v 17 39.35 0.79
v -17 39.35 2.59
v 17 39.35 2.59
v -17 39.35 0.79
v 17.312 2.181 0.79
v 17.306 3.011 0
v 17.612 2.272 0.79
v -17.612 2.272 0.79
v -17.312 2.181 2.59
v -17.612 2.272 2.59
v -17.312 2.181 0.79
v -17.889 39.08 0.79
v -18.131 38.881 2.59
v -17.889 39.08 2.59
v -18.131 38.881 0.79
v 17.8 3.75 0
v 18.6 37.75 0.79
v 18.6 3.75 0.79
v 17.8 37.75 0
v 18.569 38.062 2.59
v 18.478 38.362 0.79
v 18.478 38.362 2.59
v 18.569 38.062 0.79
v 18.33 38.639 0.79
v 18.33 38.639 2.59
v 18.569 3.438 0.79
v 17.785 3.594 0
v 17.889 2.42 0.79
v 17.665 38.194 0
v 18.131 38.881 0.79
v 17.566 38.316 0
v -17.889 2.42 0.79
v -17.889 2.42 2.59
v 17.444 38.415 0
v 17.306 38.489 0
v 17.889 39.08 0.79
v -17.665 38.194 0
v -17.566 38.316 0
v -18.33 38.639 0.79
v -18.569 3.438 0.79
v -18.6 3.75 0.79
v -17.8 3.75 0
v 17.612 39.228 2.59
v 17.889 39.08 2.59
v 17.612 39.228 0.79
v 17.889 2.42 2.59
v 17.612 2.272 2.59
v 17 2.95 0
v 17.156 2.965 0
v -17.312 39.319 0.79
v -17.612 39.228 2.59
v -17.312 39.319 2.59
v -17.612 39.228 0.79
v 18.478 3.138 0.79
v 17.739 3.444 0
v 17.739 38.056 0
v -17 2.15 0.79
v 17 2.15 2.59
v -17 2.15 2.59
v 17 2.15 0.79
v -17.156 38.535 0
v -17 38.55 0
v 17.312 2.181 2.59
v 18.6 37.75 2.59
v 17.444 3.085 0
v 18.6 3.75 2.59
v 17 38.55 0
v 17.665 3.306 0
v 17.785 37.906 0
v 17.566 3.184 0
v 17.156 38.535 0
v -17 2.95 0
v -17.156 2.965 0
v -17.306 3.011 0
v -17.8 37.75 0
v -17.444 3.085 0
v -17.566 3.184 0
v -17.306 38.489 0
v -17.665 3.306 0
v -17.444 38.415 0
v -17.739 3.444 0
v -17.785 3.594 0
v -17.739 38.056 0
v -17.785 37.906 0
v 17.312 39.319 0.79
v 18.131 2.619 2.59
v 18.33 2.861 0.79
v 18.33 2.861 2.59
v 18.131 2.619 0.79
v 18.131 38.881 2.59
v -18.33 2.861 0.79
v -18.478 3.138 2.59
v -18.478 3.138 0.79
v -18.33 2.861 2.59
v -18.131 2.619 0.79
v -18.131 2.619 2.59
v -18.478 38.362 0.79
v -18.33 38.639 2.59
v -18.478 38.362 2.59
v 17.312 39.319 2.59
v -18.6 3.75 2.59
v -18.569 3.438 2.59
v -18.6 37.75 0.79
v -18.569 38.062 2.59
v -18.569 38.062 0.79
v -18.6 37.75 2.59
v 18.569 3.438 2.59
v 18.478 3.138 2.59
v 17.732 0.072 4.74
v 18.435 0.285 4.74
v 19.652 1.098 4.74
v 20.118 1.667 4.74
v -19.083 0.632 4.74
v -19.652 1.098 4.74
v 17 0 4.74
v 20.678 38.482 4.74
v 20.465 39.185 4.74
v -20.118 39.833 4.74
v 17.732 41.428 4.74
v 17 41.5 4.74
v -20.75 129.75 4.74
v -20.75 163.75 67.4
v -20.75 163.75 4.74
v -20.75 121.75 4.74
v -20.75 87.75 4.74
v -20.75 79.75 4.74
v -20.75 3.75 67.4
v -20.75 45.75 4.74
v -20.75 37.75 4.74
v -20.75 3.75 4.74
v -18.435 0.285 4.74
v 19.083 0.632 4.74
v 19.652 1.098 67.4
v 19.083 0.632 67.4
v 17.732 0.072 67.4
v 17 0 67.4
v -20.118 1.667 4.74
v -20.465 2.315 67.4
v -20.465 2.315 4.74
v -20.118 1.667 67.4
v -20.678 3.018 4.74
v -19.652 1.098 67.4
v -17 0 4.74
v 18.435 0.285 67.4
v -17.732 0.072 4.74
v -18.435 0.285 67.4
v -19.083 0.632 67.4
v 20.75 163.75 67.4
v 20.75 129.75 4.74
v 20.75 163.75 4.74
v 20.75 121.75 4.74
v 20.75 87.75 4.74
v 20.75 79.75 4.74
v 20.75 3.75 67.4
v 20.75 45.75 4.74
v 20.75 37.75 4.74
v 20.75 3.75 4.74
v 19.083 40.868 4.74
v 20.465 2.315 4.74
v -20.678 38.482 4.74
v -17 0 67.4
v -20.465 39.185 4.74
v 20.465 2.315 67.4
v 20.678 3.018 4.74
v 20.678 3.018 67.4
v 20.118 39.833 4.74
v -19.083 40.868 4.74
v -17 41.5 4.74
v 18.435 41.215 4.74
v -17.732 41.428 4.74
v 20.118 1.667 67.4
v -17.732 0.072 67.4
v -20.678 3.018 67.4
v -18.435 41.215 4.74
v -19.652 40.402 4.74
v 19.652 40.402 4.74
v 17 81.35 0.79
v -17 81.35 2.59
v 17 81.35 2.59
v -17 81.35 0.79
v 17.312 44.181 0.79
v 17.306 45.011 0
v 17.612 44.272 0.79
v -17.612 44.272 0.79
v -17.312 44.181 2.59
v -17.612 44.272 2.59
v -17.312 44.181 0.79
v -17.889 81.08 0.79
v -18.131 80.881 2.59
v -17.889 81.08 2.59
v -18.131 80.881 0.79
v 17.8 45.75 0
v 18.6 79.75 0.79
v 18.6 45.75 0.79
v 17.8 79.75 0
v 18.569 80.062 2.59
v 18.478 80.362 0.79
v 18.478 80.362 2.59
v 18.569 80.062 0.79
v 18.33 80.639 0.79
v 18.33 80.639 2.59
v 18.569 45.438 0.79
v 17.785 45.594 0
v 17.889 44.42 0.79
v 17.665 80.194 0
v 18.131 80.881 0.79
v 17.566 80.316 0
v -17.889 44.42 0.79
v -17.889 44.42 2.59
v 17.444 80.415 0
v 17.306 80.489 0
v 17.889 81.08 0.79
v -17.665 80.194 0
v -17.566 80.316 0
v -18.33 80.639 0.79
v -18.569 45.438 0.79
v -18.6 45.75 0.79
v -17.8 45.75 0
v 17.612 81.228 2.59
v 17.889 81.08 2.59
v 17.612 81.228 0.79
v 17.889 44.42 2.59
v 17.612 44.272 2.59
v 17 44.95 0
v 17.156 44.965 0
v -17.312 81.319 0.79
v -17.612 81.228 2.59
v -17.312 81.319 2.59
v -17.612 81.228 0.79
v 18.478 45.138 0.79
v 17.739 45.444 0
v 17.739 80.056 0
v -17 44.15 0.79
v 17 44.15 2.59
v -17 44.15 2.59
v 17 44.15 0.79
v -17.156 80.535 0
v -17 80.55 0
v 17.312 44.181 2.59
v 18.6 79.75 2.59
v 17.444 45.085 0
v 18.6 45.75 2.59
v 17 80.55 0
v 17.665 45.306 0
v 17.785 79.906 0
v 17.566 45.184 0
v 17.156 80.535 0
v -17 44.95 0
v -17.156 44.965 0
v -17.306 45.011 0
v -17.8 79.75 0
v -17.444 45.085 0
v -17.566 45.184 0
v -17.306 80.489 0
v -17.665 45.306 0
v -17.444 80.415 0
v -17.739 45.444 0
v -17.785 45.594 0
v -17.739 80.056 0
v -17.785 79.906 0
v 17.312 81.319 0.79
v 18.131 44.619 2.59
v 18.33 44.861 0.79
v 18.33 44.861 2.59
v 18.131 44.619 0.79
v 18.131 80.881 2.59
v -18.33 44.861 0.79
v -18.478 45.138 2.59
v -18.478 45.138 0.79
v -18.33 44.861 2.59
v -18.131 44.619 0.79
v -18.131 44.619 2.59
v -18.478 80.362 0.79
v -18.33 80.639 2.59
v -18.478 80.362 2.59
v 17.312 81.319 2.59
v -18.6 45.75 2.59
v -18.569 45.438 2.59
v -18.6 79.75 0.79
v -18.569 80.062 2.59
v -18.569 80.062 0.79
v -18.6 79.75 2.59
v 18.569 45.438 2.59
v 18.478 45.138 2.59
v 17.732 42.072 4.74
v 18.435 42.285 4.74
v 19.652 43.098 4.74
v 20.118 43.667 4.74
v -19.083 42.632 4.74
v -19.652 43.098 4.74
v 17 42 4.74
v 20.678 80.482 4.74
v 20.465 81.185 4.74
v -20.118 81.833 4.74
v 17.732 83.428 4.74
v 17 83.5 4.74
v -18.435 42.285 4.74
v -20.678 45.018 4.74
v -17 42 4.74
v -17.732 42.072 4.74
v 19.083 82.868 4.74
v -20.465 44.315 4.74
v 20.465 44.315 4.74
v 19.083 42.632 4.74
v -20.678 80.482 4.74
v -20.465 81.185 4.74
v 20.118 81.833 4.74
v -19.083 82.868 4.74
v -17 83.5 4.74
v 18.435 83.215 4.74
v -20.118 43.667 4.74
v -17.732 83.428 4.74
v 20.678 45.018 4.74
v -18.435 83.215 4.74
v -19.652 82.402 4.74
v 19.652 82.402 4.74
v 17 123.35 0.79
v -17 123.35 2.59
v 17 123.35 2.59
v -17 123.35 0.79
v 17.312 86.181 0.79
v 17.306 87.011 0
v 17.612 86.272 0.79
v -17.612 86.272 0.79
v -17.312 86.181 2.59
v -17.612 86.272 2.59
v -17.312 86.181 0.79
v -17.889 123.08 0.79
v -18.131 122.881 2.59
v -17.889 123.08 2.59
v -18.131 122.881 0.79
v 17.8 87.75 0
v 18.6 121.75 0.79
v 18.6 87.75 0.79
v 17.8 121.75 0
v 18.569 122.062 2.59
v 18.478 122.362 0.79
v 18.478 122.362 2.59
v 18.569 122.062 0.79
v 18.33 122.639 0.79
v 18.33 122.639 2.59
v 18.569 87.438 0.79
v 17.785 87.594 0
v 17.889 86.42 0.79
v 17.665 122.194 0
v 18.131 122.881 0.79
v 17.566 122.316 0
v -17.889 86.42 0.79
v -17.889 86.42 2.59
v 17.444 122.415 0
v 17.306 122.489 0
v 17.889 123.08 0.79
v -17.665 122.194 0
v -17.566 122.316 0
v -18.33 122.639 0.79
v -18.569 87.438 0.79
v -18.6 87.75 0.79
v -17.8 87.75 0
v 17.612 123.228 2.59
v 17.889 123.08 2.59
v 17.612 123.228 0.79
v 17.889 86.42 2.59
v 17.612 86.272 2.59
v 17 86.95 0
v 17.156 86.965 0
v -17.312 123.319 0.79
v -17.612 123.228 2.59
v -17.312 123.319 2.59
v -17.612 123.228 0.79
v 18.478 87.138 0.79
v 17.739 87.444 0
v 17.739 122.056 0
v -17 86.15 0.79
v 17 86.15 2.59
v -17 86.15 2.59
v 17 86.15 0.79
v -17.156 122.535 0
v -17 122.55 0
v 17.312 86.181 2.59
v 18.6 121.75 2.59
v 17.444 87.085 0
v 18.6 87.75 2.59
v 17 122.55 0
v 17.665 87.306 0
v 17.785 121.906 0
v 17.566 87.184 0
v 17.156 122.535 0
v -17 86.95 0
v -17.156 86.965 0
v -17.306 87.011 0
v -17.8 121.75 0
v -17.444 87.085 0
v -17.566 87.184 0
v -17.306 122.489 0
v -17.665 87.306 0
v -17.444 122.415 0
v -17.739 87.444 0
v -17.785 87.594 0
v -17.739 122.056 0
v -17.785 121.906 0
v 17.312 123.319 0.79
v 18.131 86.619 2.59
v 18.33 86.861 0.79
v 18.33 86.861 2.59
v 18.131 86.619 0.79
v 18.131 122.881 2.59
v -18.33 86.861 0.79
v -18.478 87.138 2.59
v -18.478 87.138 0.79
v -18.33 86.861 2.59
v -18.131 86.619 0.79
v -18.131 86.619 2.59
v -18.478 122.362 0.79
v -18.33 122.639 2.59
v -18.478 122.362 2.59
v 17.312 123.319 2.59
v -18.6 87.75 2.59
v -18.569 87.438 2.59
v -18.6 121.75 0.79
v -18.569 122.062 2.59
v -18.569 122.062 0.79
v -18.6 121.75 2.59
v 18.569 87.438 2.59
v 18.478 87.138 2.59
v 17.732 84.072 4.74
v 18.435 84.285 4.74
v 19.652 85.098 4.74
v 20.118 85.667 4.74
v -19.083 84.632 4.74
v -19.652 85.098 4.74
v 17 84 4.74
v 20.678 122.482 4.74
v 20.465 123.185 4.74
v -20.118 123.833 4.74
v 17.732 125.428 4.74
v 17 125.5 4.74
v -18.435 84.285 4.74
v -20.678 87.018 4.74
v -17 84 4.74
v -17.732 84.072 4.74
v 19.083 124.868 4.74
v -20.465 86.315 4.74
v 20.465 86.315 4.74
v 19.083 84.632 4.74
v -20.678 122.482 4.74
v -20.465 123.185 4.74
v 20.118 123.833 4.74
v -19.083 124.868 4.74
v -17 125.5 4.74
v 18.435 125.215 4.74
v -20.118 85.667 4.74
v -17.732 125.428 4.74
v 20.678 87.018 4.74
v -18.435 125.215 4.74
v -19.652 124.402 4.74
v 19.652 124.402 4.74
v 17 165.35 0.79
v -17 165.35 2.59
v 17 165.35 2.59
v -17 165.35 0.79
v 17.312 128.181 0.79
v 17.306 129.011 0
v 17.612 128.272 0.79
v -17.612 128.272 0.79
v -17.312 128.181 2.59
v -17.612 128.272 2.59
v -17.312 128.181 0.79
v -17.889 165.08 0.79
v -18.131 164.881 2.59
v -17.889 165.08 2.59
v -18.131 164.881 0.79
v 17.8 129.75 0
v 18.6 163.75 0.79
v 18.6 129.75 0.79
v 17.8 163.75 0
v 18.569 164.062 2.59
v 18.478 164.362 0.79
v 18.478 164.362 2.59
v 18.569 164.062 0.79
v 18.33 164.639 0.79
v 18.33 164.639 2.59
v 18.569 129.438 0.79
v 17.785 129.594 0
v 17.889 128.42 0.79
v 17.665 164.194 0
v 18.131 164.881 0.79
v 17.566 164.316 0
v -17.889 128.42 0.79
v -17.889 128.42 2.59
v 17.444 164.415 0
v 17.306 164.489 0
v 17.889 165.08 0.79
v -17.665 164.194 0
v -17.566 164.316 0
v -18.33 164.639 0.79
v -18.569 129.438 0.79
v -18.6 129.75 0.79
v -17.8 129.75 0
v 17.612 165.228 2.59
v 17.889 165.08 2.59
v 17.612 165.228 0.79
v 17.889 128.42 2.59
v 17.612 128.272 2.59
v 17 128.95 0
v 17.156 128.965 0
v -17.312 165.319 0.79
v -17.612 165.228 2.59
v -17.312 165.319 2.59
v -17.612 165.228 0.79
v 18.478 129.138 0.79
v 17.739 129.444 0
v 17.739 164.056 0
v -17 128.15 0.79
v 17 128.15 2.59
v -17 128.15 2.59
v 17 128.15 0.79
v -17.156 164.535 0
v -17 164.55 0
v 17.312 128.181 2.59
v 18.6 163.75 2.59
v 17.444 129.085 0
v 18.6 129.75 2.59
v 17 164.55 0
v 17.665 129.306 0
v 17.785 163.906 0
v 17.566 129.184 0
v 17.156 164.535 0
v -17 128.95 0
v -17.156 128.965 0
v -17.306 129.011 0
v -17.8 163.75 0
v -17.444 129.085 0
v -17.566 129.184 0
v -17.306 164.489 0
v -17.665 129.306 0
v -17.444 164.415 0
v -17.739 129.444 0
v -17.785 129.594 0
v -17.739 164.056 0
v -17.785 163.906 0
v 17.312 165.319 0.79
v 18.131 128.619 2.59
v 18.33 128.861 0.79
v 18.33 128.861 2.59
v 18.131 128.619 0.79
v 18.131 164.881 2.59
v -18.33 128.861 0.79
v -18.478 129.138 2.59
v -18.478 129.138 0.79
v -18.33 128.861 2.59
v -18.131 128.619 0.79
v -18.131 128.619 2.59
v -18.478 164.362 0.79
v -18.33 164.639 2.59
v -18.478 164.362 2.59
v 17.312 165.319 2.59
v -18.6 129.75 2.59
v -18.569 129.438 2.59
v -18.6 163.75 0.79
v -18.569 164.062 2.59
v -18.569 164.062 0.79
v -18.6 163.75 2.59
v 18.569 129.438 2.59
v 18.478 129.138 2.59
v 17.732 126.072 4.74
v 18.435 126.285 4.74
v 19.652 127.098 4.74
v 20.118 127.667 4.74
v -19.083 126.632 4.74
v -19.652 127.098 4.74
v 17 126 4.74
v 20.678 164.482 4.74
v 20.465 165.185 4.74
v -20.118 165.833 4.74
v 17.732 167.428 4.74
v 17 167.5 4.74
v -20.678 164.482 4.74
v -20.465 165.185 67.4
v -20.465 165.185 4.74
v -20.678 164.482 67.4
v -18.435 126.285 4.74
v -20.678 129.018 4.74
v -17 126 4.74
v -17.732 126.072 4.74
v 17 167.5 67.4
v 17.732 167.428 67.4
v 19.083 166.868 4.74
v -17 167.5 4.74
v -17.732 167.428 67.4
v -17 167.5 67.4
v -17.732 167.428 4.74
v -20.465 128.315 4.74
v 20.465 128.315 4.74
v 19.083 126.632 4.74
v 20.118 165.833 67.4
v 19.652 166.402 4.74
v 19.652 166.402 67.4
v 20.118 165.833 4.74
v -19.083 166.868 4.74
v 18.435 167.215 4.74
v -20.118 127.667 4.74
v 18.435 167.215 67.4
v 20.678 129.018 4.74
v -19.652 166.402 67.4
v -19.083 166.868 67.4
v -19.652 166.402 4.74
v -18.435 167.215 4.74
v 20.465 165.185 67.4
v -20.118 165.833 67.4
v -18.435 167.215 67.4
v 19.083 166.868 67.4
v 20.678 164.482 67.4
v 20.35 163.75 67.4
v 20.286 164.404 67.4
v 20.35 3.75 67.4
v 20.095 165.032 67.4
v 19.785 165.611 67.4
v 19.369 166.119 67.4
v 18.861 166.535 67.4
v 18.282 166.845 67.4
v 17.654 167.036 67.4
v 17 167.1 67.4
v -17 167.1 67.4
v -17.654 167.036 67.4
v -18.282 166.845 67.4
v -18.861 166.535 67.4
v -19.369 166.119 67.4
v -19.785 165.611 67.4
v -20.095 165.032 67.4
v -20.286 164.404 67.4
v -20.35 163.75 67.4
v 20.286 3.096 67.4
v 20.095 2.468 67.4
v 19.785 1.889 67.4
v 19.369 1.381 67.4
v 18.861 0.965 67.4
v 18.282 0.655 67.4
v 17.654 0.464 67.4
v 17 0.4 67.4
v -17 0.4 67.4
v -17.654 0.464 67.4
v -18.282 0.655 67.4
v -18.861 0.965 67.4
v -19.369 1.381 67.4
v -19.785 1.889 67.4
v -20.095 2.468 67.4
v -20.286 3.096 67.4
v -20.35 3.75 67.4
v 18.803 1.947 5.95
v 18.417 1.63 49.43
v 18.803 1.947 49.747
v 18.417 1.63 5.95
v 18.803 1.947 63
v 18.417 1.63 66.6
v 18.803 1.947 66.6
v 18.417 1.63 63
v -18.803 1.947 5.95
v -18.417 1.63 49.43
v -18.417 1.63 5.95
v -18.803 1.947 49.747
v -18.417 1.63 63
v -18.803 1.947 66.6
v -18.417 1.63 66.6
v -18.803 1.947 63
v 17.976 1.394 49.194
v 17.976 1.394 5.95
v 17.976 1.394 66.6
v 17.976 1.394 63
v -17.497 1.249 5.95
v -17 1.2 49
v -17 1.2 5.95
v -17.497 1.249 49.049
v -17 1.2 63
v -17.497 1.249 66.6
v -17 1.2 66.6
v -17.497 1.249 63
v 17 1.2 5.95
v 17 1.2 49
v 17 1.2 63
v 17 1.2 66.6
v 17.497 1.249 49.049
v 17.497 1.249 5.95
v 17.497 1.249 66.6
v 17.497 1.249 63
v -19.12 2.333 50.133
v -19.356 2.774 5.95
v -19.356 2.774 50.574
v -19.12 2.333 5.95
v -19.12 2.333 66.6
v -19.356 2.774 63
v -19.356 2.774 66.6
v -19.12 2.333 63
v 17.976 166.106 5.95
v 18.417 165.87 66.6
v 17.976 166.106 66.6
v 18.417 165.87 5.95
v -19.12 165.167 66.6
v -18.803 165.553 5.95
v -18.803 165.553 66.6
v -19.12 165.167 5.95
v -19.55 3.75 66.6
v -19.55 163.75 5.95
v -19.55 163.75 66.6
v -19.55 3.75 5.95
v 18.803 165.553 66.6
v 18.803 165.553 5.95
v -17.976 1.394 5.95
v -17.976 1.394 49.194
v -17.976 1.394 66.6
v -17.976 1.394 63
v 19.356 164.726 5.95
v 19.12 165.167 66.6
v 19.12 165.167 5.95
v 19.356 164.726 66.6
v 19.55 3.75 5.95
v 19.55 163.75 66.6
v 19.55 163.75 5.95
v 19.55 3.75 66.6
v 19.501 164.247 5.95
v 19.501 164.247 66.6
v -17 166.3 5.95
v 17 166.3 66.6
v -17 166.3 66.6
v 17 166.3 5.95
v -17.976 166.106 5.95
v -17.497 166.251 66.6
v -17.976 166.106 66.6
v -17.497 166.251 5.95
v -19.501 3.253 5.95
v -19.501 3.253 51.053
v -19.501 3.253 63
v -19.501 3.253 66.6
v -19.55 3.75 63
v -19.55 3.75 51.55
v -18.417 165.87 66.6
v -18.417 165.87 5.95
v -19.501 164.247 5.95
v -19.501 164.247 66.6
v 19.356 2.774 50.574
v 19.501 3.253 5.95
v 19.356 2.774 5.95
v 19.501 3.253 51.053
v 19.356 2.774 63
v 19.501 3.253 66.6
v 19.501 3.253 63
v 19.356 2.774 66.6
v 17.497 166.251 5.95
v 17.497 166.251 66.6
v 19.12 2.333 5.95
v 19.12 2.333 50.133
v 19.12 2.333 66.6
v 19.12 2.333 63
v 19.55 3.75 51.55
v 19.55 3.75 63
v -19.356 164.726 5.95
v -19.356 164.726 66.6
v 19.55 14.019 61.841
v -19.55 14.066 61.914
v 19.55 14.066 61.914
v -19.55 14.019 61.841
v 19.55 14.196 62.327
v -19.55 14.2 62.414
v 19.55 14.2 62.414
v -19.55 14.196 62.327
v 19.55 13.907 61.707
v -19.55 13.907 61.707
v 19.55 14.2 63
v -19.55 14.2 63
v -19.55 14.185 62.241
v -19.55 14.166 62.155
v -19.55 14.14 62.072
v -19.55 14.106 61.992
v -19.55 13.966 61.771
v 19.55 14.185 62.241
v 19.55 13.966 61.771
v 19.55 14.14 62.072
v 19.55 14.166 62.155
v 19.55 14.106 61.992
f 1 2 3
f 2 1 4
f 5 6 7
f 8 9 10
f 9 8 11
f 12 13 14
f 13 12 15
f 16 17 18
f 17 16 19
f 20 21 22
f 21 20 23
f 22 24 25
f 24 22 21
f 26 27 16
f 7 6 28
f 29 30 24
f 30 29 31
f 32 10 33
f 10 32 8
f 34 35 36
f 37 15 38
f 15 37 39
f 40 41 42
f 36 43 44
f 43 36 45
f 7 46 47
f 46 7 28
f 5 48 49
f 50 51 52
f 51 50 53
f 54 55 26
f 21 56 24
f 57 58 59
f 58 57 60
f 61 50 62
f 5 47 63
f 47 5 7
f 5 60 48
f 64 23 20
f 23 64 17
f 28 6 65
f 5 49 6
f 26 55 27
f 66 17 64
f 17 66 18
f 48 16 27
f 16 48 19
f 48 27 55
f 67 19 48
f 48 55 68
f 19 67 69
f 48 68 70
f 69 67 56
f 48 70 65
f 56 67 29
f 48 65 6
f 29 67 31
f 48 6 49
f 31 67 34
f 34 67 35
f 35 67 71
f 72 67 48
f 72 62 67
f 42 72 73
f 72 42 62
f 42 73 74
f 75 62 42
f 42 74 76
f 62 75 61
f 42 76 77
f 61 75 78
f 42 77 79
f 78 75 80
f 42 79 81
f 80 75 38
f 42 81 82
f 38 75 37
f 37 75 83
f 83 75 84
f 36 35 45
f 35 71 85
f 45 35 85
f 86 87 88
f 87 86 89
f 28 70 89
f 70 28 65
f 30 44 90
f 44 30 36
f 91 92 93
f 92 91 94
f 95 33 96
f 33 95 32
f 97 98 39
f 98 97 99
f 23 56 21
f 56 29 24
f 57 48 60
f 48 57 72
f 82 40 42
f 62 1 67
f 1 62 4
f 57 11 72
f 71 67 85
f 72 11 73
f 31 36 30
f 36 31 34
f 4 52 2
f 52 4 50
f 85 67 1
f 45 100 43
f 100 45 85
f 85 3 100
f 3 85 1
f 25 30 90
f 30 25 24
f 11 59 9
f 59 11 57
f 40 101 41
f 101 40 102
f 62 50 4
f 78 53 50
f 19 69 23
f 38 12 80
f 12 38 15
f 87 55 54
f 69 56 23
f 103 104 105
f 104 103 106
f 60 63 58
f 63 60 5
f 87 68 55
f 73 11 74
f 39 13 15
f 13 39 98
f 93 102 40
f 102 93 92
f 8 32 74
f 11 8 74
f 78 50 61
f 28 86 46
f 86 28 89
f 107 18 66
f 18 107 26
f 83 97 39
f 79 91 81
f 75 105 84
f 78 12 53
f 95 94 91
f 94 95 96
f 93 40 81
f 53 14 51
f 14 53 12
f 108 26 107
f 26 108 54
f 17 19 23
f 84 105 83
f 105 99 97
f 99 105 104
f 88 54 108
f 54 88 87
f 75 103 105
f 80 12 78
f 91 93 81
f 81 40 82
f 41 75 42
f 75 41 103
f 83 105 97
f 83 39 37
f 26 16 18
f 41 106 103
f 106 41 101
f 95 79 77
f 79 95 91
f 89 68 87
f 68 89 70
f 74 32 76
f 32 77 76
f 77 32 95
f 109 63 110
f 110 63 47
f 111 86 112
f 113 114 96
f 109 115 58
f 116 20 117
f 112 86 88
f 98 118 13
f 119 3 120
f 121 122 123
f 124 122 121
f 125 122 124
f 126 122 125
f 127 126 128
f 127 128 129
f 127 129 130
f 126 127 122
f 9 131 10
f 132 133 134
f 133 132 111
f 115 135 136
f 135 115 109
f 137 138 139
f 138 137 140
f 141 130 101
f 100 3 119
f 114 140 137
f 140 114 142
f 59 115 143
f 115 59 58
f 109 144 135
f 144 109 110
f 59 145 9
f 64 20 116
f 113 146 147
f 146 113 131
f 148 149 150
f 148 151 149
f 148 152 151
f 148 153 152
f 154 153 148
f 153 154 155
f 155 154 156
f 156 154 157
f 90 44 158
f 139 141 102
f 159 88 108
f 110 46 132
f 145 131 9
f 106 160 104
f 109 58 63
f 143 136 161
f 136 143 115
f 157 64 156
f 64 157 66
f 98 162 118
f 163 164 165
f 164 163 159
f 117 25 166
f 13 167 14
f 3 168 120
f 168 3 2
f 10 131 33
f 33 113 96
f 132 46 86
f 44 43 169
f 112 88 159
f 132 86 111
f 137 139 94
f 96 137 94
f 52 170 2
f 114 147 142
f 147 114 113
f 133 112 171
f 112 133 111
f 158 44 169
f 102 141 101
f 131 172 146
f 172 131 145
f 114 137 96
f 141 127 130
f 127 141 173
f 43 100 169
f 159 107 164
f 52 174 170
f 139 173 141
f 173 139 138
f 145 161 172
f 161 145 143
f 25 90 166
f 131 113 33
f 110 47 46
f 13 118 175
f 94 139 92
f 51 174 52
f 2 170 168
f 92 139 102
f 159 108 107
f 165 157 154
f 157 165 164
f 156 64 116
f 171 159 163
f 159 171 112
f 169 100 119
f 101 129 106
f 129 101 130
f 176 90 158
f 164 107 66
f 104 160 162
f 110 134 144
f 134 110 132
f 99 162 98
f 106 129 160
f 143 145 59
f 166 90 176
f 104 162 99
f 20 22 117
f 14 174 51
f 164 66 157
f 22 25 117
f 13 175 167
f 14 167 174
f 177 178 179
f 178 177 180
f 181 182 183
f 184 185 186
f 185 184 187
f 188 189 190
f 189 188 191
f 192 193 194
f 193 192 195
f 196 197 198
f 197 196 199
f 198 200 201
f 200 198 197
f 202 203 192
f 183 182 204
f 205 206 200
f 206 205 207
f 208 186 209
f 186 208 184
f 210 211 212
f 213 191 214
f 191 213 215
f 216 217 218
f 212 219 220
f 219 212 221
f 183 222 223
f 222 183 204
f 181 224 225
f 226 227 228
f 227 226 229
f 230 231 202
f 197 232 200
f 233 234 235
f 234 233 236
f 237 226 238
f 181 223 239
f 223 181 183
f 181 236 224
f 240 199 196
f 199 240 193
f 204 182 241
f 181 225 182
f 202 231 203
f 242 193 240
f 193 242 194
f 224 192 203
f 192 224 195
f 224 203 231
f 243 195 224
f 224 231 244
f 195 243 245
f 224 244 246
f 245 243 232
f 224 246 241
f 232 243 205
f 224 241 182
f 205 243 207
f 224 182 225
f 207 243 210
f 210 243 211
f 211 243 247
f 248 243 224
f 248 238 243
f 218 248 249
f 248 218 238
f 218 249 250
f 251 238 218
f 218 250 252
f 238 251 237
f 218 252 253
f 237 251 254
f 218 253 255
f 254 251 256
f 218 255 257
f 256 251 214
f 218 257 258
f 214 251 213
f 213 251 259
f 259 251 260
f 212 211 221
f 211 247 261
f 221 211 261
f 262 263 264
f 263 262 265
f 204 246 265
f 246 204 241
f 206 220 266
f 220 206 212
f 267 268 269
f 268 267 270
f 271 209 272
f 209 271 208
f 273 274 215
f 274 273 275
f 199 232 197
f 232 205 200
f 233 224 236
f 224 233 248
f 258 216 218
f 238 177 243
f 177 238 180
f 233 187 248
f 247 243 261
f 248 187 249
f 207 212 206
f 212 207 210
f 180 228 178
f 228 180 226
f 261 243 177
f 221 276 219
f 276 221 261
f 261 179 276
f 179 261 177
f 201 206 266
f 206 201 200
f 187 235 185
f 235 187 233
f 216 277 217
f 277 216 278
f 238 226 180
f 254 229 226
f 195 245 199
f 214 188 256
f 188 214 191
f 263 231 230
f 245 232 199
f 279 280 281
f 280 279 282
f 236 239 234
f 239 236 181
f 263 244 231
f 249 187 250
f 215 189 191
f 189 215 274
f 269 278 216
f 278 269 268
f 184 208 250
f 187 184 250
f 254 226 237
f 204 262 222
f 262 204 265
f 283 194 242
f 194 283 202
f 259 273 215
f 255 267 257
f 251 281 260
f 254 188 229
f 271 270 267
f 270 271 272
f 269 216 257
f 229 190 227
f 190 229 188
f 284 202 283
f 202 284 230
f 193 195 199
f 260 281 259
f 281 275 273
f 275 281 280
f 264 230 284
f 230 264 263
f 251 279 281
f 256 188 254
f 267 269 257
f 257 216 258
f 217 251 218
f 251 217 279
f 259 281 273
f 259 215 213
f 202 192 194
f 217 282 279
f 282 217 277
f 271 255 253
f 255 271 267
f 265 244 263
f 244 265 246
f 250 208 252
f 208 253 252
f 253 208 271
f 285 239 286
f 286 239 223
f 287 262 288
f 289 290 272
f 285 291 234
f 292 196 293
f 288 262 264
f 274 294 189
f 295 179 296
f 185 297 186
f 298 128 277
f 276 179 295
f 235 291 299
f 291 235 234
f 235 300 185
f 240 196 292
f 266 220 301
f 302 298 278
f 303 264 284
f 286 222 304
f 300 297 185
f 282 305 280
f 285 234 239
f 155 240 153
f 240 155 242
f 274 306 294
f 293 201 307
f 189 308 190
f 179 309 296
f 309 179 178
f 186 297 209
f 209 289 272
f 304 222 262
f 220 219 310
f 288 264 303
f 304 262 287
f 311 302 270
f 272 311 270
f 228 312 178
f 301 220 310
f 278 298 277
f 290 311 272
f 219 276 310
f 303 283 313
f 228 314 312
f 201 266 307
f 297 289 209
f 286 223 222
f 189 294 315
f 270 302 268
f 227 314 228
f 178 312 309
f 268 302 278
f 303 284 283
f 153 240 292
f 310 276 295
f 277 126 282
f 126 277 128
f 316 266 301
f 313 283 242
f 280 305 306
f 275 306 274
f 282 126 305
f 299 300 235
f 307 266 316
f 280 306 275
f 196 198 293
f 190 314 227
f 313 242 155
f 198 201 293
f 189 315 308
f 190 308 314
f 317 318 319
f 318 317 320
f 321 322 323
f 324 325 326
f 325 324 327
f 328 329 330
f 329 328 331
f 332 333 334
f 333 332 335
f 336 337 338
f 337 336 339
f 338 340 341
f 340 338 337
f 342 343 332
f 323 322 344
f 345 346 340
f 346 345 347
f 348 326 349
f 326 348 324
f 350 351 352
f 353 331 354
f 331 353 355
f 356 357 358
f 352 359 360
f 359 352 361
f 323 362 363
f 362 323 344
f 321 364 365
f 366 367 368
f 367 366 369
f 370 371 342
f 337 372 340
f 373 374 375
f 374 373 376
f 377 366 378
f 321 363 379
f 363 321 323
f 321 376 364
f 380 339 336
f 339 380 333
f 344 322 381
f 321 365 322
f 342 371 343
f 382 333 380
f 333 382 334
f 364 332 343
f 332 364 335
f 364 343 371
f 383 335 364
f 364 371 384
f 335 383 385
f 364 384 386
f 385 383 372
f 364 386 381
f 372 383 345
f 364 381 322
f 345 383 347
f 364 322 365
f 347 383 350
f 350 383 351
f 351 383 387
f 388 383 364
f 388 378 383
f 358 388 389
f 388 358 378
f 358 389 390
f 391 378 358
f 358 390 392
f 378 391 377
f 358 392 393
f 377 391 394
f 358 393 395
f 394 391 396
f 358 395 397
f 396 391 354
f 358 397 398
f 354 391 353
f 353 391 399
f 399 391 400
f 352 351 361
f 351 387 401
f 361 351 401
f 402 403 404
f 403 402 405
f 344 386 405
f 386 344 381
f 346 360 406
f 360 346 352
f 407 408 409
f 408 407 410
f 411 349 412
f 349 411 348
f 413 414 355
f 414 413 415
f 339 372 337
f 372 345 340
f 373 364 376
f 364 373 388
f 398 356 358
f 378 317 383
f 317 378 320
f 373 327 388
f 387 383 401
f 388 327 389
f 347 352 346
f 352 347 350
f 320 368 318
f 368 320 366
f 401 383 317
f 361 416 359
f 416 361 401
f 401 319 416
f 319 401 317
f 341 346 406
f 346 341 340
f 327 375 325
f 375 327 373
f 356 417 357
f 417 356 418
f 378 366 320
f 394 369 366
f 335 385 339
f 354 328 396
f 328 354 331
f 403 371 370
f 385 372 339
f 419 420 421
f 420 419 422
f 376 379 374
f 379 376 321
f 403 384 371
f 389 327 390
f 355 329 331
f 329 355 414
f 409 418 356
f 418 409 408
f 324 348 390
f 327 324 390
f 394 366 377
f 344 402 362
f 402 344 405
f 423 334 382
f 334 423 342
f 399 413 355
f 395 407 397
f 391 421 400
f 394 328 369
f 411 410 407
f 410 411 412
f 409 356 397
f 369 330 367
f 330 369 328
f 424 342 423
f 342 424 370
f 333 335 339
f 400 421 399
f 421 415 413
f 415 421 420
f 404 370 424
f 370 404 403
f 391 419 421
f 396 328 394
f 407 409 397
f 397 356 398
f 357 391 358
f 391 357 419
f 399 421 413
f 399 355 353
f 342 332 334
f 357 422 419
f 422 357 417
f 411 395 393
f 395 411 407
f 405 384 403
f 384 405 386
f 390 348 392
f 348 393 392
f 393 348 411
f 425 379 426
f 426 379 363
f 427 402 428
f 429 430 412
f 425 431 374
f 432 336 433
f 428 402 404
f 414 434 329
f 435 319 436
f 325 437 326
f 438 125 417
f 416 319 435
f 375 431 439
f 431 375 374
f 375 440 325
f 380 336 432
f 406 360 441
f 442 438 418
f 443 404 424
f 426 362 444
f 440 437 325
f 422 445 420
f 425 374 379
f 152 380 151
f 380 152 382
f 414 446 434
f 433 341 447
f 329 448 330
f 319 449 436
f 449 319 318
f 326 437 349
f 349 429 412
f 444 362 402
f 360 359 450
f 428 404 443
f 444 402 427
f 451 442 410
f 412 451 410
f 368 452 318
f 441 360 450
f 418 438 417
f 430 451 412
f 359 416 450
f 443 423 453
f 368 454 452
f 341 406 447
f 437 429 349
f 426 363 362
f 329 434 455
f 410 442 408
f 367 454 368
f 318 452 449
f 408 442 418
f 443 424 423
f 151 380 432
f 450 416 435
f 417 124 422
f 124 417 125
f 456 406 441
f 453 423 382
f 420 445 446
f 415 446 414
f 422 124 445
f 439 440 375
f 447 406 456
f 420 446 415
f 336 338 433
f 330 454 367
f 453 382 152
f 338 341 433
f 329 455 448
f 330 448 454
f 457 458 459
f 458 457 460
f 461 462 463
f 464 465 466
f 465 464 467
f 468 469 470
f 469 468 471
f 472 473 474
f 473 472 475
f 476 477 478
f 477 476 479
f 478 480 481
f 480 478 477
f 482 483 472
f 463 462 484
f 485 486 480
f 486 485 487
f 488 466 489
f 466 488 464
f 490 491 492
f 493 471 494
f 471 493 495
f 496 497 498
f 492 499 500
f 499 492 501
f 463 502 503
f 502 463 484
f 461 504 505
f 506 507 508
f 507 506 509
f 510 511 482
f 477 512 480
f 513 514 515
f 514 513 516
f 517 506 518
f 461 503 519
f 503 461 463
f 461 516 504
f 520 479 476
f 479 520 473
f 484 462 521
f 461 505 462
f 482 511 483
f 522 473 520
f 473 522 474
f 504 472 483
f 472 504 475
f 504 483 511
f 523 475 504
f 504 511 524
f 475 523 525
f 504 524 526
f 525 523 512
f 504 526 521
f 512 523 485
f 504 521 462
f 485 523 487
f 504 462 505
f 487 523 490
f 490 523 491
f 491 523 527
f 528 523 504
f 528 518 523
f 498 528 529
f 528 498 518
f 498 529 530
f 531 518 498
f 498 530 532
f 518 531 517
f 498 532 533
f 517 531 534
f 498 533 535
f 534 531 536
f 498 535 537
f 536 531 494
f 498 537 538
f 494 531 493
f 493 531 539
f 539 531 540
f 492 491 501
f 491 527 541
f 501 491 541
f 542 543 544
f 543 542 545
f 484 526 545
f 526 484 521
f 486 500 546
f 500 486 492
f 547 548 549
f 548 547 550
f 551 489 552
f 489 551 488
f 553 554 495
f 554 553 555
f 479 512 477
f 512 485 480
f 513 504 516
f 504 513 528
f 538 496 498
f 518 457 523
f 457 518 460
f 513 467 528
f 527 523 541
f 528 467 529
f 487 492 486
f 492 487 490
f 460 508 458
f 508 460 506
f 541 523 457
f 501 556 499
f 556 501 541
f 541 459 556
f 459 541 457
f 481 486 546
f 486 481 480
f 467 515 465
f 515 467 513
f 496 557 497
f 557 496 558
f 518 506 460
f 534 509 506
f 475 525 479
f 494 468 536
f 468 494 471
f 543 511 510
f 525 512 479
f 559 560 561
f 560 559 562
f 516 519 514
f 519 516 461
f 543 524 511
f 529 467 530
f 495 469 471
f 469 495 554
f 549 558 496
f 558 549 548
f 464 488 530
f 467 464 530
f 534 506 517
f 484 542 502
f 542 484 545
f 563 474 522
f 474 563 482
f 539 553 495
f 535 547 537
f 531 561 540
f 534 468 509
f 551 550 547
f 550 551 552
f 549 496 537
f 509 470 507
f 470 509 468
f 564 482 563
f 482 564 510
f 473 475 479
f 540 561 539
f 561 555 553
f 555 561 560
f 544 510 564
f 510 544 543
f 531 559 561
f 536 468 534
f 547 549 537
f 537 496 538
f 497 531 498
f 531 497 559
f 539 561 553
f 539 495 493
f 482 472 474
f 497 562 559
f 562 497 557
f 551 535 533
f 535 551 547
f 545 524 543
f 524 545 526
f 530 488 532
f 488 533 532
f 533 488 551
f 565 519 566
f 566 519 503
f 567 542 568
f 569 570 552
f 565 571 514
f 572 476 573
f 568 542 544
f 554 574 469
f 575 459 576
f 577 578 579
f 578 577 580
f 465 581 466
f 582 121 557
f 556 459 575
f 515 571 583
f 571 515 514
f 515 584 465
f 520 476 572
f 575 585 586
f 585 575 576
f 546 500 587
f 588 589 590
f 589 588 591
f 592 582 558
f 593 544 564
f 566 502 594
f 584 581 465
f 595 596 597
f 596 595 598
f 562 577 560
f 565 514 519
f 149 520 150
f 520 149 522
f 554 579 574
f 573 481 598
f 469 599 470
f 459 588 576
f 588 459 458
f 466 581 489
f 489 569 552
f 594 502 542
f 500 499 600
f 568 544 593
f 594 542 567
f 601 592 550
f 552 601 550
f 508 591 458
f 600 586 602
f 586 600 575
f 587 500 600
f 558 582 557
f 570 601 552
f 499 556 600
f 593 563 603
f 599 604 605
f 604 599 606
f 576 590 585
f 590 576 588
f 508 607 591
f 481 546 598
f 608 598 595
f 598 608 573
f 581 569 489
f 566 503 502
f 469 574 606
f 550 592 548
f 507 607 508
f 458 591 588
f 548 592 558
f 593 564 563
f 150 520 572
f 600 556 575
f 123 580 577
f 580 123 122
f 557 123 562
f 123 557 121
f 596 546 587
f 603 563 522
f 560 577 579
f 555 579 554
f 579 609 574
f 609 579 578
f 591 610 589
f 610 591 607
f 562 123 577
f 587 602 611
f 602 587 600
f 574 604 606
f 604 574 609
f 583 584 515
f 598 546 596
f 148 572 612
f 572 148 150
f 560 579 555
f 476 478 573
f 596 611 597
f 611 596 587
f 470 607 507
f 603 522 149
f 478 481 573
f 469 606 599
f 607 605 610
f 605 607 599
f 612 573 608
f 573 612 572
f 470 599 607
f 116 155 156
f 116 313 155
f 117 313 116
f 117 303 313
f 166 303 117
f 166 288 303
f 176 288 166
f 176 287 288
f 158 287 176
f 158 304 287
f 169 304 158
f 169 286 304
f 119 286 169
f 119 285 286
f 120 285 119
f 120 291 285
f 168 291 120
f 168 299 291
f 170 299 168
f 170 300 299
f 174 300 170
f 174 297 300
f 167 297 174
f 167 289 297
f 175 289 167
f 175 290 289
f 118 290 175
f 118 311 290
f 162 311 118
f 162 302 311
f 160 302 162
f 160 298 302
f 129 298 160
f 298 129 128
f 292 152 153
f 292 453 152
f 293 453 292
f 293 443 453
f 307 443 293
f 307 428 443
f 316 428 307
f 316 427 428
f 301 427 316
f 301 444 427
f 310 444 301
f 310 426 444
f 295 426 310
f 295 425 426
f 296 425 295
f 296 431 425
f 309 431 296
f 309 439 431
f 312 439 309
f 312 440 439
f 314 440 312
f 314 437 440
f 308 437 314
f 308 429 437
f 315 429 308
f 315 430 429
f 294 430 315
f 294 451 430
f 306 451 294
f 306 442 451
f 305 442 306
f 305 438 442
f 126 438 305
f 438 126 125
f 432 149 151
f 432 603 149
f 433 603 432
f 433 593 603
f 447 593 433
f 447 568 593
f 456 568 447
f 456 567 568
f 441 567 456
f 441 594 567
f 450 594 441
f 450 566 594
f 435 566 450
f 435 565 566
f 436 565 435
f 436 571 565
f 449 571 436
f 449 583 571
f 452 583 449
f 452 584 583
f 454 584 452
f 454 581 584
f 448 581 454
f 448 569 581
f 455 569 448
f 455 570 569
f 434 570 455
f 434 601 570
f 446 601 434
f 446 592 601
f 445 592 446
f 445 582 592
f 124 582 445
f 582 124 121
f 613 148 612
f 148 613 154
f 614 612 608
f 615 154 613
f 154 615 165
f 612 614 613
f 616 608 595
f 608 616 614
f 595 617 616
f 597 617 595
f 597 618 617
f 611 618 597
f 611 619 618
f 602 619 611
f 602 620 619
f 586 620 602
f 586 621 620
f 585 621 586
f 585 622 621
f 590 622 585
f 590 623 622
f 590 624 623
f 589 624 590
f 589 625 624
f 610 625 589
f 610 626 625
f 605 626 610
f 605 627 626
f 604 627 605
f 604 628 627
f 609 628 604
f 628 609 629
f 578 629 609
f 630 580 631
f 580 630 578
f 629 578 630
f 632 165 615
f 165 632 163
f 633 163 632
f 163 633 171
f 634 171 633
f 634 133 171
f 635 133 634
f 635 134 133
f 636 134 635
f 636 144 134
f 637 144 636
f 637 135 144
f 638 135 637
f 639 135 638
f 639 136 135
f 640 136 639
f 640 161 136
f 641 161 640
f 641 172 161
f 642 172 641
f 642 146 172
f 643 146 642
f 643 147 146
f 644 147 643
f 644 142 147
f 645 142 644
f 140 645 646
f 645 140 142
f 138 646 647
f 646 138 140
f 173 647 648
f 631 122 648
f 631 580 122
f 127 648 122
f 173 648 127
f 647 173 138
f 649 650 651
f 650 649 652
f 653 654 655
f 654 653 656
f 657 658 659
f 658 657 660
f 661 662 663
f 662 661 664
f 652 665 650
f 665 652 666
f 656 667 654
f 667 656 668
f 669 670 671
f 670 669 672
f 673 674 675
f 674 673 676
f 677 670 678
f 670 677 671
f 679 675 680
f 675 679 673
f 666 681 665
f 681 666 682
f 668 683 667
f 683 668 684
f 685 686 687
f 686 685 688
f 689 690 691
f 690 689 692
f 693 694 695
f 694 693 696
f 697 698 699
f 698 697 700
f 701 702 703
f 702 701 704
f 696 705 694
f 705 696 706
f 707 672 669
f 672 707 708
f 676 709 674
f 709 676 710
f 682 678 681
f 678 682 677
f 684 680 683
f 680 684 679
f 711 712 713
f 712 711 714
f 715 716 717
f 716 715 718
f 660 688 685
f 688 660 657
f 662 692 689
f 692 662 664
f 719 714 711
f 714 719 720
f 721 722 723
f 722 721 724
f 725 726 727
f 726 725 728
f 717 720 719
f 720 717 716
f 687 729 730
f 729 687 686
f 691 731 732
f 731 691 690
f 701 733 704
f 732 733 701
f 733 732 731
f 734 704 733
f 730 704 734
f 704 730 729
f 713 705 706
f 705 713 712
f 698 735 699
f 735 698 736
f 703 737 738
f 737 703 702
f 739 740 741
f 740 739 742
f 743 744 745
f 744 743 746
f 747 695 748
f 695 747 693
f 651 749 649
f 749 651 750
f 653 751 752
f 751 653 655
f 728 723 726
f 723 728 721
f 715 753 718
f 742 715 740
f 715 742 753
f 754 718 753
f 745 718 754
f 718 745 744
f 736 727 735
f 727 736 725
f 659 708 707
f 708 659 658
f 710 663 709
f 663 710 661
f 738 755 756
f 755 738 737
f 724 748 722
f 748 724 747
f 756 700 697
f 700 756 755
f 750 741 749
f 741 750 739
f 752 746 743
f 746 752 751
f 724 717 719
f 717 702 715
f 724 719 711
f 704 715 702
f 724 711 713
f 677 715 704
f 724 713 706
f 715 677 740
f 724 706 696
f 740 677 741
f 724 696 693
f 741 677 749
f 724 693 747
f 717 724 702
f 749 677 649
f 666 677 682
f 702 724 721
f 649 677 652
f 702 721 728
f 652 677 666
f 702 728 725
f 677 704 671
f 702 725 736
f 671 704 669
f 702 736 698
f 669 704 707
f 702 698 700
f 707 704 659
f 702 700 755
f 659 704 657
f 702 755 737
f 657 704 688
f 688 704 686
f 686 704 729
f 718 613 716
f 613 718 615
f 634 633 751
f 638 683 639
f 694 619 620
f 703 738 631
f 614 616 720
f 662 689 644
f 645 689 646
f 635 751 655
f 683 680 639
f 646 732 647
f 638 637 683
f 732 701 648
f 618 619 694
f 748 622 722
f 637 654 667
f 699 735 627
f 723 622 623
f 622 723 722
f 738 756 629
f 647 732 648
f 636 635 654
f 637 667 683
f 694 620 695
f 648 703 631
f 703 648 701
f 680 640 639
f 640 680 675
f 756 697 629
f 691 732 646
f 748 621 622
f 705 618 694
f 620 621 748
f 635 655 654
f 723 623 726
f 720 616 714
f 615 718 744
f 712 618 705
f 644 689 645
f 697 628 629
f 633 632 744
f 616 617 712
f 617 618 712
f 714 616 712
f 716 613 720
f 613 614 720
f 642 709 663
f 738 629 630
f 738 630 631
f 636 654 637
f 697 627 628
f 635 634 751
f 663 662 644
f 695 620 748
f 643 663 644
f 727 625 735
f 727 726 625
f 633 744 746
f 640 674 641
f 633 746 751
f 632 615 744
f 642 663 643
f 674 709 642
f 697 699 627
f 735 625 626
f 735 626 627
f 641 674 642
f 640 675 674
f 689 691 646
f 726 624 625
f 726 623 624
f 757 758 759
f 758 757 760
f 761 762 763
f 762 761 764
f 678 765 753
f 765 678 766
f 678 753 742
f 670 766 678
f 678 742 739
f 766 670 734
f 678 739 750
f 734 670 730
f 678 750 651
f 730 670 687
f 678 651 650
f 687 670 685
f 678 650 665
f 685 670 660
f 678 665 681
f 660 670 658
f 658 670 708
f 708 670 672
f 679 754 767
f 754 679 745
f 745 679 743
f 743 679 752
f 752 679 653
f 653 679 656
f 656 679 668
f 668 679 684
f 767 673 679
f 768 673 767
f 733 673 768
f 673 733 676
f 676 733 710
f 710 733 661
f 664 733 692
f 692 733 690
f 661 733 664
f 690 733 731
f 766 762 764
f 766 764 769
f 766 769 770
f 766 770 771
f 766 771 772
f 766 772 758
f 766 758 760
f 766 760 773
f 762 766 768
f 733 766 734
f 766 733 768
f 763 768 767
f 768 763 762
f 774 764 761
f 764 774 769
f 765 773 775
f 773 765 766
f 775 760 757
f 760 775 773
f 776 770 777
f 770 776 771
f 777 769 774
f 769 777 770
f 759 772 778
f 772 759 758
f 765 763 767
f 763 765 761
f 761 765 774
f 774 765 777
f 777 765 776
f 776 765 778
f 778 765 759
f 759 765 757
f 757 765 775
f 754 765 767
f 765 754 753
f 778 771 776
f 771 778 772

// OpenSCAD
// file: ../../../modules/gridfinity.scad
// Gridfinity ベースプレートの共有 module。
// 寸法は Gridfinity 仕様 (Zack Freedman) の baseplate 輪郭に従う:
//   ピッチ 42、ソケット上端開口 41.5 (角 R4)、上から 45° 面取り 2.15 →
//   垂直 1.8 (37.2 角・R1.85) → 45° 面取り 0.7 → 底 35.8 角 (R1.15)。
//   ソケット深さ = 2.15 + 1.8 + 0.7 = 4.65。
//
// 座標系: X が列方向 (中央が 0)、Y が行方向 (板の前端が 0)、Z=0 が板の底面。
// 板の外形は grid とは独立に rim で与えるので、grid より大きい板 (縁付き) を
// 作れる。ソケットは rim=[left, right, front, back] の内側へ 42 ピッチで並ぶ。

gf_pitch = 42;
gf_socket_top = 41.5; // 上端開口
gf_socket_mid = 37.2; // 垂直部
gf_socket_bot = 35.8; // 底
gf_socket_r_top = 4;
gf_socket_r_mid = 1.85;
gf_socket_r_bot = 1.15;
gf_chamfer_top = 2.15;
gf_wall_h = 1.8;
gf_chamfer_bot = 0.7;
gf_socket_depth = gf_chamfer_top + gf_wall_h + gf_chamfer_bot; // 4.65
gf_fn = 32;
gf_eps = 0.01; // hull 用の薄板の厚さ
gf_over = 0.5; // 切削の抜き代

// 角丸正方形または矩形 (w は一辺、または [幅, 奥行き]、角 R)
module
gf_rounded_square(w, r)
{
    offset(r = r, $fn = gf_fn)
        square(is_list(w) ? w - [ 2 * r, 2 * r ] : w - 2 * r, center = true);
}

// 厚さ gf_eps の角丸正方形の薄板を z に置く (hull の骨)
module
gf_slab(w, r, z)
{
    translate([ 0, 0, z ]) linear_extrude(gf_eps) gf_rounded_square(w, r);
}

// ソケット1個の切削体。z=0 がソケットの底 (床の天面)、+Z へ 4.65 で天面に出る。
// clearance は嵌合の逃げで、輪郭を全周へ clearance だけ外へ出す (幅 +2c、角 R
// +c)。pitch_x は X 方向のセル幅。端数でも角 R と面取りの寸法を保つ。
module
gf_socket_cut(clearance = 0, pitch_x = gf_pitch)
{
    z1 = gf_chamfer_bot;
    z2 = z1 + gf_wall_h;
    z3 = gf_socket_depth;
    c = clearance;
    assert(pitch_x > gf_pitch - gf_socket_top + 2 * gf_socket_r_top,
           "Cell width is too small for the socket corner radius");
    delta = [ pitch_x - gf_pitch, 0 ];
    bot = [ gf_socket_bot + 2 * c, gf_socket_bot + 2 * c ] + delta;
    mid = [ gf_socket_mid + 2 * c, gf_socket_mid + 2 * c ] + delta;
    top = [ gf_socket_top + 2 * c, gf_socket_top + 2 * c ] + delta;
    hull()
    {
        gf_slab(bot, gf_socket_r_bot + c, 0);
        gf_slab(mid, gf_socket_r_mid + c, z1 - gf_eps);
    }
    hull()
    {
        gf_slab(mid, gf_socket_r_mid + c, z1 - gf_eps);
        gf_slab(mid, gf_socket_r_mid + c, z2 - gf_eps);
    }
    hull()
    {
        gf_slab(mid, gf_socket_r_mid + c, z2 - gf_eps);
        gf_slab(top, gf_socket_r_top + c, z3 - gf_eps);
    }
    // 天面より上へ抜く (天面と同一平面の退化した面を残さない)
    gf_slab(top, gf_socket_r_top + c, z3 - gf_eps);
    translate([ 0, 0, z3 - gf_eps ]) linear_extrude(gf_over + gf_eps)
        gf_rounded_square(top, gf_socket_r_top + c);
}

// ベースプレート。cols x rows のソケットを床 floor_t の上に彫る。
// rim = [left, right, front, back] はソケット列の外側に残す縁の幅。
// 板の幅 = cols*42 + left + right、奥行き = rows*42 + front + back。
// cols の端数は左端の細幅セルになる。rows は正の整数。
// clearance はソケットの嵌合の逃げ (gf_socket_cut を参照)。
module
gf_baseplate(cols, rows, rim = [ 0, 0, 0, 0 ], floor_t = 1, clearance = 0)
{
    grid_w = cols * gf_pitch;
    grid_d = rows * gf_pitch;
    plate_w = grid_w + rim[0] + rim[1];
    plate_d = grid_d + rim[2] + rim[3];
    x0 = -plate_w / 2 + rim[0]; // ソケット列の左端
    first_pitch = grid_w - (ceil(cols) - 1) * gf_pitch;
    difference()
    {
        translate([ -plate_w / 2, 0, 0 ])
            cube([ plate_w, plate_d, floor_t + gf_socket_depth ]);
        for (c = [0:ceil(cols) - 1], r = [0:rows - 1])
            translate([
                x0 + (c == 0 ? first_pitch / 2
                             : first_pitch + (c - 0.5) * gf_pitch),
                rim[2] + (r + 0.5) * gf_pitch,
                floor_t
            ]) gf_socket_cut(clearance, c == 0 ? first_pitch : gf_pitch);
    }
}
// file: ../../../modules/gridfinity_bins.scad
include <gridfinity_bin.scad>

// assets/gridfinity-bin/ の bin 群の共通値と、サイズ 3 引数の払い出し口。
// 単体では何も描かない。設計の経緯と確定値は
// ledger/designs/gridfinity-bin-4u.md が正本。
// 通常binは4U/9U、X={1,1.5,2,2.5,3} × Y={1,2,3,4,5,5.5}。
// 両軸に端数を持つ組み合わせはassetに置かない（各高さ28種）。
// Xが横、Yがラベルの壁から奥、unitsが高さ（7mm単位）。
wall = 1.2;    // 0.4 ノズル 3 本
floor_t = 1.2; // 底 (4.75) の上に載せる床。床の天面 z = 5.95
label_d = 13;  // 12mm 幅のラベルシールを貼る天板の張り出し
label_t = 1; // 天板の厚さ (user 指定)。下は 45° の無垢のくさび
label_r = 1; // 天板の先端と 45° 面の境目の R (user 指定)
// カードケース (goods/card_case_2x3x4u.scad) の値。カードは ISO/IEC 7810 ID-1 (85.6 × 54 ×
// 0.76、隅 R3) で、長辺を Y (rows 方向) に寝かせ、X 中央・手前の壁から 10 奥に置く。ポケットは
// カードより 1 大きい (片側 0.5)。右奥のマスは壁の内面まで抜き、床と底を外形に平行な 45° の窪みにする。
// ポケットの左右の埋めの天面 (幅 13.05) が 12mm のラベルを貼る帯。ポケットと穴の交点の
// 縦エッジは丸める (開口の上縁は丸めない: 壁を上端まで垂直に保ち、収まる枚数を減らさない)
card_w = 54;    // カードの短辺 (X)。user 指定「高さ 54」
card_d = 85.6;  // カードの長辺 (Y)。user 指定「幅 85.6」
card_clear = 1; // ポケットの余裕 (user 指定「+1mm」)
// ポケットの手前の辺の、手前の壁の内面からの距離 (user 指定「10mm」)
card_off = 10;
// ポケットの平面の隅 R (user 指定「角の丸み 3mm」。ID-1 の隅は 2.88..3.48)
card_r = 3;
// ポケットと穴が交わる所の、埋めの凸の縦エッジの R (指の当たる角)
card_edge_r = 2;
recess_skin = floor_t + 1.75; // 窪みの床 z (底の皮)。user 指定「壁厚と同じ 1.2 は過剰、1.75 返す」

function bin_contract(cols, rows, units) = str("CONTRACT units=",
                                               units,
                                               " pitch=",
                                               gf_pitch,
                                               " outer=",
                                               gfb_outer,
                                               " h=",
                                               units* gfb_unit,
                                               " lip=",
                                               gfb_lip_h,
                                               " base=",
                                               gfb_base_bot,
                                               "/",
                                               gfb_base_mid,
                                               "/",
                                               gfb_outer,
                                               " base_h=",
                                               gfb_base_h,
                                               " wall=",
                                               wall,
                                               " floor_top=",
                                               gfb_base_h + floor_t,
                                               " label=",
                                               label_d,
                                               "x",
                                               label_t,
                                               " wedge=45 fillet=",
                                               label_r,
                                               " bin=",
                                               cols,
                                               "x",
                                               rows,
                                               " size=",
                                               cols* gf_pitch - 0.5,
                                               "x",
                                               rows* gf_pitch - 0.5);

// (cols, rows, units) でラベル付き bin を払い出す。例: gridfinity_bin(2, 4, 4)
module
gridfinity_bin(cols, rows, units = 4)
{
    echo(bin_contract(cols, rows, units));
    gfb_bin(cols, rows, units, wall, floor_t, label_d, label_t, label_r);
}

function card_contract(cols, rows, units) = str("CONTRACT card units=",
                                                units,
                                                " bin=",
                                                cols,
                                                "x",
                                                rows,
                                                " size=",
                                                cols* gf_pitch - 0.5,
                                                "x",
                                                rows* gf_pitch - 0.5,
                                                " h=",
                                                units* gfb_unit,
                                                " lip=",
                                                gfb_lip_h,
                                                " floor_top=",
                                                gfb_base_h + floor_t,
                                                " card=",
                                                card_w,
                                                "x",
                                                card_d,
                                                " pocket=",
                                                card_w + card_clear,
                                                "x",
                                                card_d + card_clear,
                                                " at=",
                                                -(card_w + card_clear) / 2,
                                                ",",
                                                wall + card_off,
                                                " hole=",
                                                (cols - 1) / 2 * gf_pitch - gfb_outer / 2,
                                                ",",
                                                (rows - 0.5) * gf_pitch - 0.25 - gfb_outer / 2,
                                                " hole_r=",
                                                gfb_outer_r - wall,
                                                " recess=",
                                                gfb_outer - 2 * wall,
                                                "/",
                                                gfb_base_mid - 2 * wall,
                                                " recess_floor=",
                                                recess_skin,
                                                " r=",
                                                card_r,
                                                " edge_r=",
                                                card_edge_r);

// (cols, rows, units) でカードケースを払い出す。例: gridfinity_card_case(2, 3, 4)
module
gridfinity_card_case(cols, rows, units = 4)
{
    echo(card_contract(cols, rows, units));
    gfb_card_case(cols,
                  rows,
                  units,
                  wall,
                  floor_t,
                  [ card_w, card_d ],
                  card_clear,
                  card_off,
                  card_r,
                  recess_skin,
                  card_edge_r);
}
// main file
include <../../../modules/gridfinity_bins.scad>

gridfinity_bin(1, 4, 9);
